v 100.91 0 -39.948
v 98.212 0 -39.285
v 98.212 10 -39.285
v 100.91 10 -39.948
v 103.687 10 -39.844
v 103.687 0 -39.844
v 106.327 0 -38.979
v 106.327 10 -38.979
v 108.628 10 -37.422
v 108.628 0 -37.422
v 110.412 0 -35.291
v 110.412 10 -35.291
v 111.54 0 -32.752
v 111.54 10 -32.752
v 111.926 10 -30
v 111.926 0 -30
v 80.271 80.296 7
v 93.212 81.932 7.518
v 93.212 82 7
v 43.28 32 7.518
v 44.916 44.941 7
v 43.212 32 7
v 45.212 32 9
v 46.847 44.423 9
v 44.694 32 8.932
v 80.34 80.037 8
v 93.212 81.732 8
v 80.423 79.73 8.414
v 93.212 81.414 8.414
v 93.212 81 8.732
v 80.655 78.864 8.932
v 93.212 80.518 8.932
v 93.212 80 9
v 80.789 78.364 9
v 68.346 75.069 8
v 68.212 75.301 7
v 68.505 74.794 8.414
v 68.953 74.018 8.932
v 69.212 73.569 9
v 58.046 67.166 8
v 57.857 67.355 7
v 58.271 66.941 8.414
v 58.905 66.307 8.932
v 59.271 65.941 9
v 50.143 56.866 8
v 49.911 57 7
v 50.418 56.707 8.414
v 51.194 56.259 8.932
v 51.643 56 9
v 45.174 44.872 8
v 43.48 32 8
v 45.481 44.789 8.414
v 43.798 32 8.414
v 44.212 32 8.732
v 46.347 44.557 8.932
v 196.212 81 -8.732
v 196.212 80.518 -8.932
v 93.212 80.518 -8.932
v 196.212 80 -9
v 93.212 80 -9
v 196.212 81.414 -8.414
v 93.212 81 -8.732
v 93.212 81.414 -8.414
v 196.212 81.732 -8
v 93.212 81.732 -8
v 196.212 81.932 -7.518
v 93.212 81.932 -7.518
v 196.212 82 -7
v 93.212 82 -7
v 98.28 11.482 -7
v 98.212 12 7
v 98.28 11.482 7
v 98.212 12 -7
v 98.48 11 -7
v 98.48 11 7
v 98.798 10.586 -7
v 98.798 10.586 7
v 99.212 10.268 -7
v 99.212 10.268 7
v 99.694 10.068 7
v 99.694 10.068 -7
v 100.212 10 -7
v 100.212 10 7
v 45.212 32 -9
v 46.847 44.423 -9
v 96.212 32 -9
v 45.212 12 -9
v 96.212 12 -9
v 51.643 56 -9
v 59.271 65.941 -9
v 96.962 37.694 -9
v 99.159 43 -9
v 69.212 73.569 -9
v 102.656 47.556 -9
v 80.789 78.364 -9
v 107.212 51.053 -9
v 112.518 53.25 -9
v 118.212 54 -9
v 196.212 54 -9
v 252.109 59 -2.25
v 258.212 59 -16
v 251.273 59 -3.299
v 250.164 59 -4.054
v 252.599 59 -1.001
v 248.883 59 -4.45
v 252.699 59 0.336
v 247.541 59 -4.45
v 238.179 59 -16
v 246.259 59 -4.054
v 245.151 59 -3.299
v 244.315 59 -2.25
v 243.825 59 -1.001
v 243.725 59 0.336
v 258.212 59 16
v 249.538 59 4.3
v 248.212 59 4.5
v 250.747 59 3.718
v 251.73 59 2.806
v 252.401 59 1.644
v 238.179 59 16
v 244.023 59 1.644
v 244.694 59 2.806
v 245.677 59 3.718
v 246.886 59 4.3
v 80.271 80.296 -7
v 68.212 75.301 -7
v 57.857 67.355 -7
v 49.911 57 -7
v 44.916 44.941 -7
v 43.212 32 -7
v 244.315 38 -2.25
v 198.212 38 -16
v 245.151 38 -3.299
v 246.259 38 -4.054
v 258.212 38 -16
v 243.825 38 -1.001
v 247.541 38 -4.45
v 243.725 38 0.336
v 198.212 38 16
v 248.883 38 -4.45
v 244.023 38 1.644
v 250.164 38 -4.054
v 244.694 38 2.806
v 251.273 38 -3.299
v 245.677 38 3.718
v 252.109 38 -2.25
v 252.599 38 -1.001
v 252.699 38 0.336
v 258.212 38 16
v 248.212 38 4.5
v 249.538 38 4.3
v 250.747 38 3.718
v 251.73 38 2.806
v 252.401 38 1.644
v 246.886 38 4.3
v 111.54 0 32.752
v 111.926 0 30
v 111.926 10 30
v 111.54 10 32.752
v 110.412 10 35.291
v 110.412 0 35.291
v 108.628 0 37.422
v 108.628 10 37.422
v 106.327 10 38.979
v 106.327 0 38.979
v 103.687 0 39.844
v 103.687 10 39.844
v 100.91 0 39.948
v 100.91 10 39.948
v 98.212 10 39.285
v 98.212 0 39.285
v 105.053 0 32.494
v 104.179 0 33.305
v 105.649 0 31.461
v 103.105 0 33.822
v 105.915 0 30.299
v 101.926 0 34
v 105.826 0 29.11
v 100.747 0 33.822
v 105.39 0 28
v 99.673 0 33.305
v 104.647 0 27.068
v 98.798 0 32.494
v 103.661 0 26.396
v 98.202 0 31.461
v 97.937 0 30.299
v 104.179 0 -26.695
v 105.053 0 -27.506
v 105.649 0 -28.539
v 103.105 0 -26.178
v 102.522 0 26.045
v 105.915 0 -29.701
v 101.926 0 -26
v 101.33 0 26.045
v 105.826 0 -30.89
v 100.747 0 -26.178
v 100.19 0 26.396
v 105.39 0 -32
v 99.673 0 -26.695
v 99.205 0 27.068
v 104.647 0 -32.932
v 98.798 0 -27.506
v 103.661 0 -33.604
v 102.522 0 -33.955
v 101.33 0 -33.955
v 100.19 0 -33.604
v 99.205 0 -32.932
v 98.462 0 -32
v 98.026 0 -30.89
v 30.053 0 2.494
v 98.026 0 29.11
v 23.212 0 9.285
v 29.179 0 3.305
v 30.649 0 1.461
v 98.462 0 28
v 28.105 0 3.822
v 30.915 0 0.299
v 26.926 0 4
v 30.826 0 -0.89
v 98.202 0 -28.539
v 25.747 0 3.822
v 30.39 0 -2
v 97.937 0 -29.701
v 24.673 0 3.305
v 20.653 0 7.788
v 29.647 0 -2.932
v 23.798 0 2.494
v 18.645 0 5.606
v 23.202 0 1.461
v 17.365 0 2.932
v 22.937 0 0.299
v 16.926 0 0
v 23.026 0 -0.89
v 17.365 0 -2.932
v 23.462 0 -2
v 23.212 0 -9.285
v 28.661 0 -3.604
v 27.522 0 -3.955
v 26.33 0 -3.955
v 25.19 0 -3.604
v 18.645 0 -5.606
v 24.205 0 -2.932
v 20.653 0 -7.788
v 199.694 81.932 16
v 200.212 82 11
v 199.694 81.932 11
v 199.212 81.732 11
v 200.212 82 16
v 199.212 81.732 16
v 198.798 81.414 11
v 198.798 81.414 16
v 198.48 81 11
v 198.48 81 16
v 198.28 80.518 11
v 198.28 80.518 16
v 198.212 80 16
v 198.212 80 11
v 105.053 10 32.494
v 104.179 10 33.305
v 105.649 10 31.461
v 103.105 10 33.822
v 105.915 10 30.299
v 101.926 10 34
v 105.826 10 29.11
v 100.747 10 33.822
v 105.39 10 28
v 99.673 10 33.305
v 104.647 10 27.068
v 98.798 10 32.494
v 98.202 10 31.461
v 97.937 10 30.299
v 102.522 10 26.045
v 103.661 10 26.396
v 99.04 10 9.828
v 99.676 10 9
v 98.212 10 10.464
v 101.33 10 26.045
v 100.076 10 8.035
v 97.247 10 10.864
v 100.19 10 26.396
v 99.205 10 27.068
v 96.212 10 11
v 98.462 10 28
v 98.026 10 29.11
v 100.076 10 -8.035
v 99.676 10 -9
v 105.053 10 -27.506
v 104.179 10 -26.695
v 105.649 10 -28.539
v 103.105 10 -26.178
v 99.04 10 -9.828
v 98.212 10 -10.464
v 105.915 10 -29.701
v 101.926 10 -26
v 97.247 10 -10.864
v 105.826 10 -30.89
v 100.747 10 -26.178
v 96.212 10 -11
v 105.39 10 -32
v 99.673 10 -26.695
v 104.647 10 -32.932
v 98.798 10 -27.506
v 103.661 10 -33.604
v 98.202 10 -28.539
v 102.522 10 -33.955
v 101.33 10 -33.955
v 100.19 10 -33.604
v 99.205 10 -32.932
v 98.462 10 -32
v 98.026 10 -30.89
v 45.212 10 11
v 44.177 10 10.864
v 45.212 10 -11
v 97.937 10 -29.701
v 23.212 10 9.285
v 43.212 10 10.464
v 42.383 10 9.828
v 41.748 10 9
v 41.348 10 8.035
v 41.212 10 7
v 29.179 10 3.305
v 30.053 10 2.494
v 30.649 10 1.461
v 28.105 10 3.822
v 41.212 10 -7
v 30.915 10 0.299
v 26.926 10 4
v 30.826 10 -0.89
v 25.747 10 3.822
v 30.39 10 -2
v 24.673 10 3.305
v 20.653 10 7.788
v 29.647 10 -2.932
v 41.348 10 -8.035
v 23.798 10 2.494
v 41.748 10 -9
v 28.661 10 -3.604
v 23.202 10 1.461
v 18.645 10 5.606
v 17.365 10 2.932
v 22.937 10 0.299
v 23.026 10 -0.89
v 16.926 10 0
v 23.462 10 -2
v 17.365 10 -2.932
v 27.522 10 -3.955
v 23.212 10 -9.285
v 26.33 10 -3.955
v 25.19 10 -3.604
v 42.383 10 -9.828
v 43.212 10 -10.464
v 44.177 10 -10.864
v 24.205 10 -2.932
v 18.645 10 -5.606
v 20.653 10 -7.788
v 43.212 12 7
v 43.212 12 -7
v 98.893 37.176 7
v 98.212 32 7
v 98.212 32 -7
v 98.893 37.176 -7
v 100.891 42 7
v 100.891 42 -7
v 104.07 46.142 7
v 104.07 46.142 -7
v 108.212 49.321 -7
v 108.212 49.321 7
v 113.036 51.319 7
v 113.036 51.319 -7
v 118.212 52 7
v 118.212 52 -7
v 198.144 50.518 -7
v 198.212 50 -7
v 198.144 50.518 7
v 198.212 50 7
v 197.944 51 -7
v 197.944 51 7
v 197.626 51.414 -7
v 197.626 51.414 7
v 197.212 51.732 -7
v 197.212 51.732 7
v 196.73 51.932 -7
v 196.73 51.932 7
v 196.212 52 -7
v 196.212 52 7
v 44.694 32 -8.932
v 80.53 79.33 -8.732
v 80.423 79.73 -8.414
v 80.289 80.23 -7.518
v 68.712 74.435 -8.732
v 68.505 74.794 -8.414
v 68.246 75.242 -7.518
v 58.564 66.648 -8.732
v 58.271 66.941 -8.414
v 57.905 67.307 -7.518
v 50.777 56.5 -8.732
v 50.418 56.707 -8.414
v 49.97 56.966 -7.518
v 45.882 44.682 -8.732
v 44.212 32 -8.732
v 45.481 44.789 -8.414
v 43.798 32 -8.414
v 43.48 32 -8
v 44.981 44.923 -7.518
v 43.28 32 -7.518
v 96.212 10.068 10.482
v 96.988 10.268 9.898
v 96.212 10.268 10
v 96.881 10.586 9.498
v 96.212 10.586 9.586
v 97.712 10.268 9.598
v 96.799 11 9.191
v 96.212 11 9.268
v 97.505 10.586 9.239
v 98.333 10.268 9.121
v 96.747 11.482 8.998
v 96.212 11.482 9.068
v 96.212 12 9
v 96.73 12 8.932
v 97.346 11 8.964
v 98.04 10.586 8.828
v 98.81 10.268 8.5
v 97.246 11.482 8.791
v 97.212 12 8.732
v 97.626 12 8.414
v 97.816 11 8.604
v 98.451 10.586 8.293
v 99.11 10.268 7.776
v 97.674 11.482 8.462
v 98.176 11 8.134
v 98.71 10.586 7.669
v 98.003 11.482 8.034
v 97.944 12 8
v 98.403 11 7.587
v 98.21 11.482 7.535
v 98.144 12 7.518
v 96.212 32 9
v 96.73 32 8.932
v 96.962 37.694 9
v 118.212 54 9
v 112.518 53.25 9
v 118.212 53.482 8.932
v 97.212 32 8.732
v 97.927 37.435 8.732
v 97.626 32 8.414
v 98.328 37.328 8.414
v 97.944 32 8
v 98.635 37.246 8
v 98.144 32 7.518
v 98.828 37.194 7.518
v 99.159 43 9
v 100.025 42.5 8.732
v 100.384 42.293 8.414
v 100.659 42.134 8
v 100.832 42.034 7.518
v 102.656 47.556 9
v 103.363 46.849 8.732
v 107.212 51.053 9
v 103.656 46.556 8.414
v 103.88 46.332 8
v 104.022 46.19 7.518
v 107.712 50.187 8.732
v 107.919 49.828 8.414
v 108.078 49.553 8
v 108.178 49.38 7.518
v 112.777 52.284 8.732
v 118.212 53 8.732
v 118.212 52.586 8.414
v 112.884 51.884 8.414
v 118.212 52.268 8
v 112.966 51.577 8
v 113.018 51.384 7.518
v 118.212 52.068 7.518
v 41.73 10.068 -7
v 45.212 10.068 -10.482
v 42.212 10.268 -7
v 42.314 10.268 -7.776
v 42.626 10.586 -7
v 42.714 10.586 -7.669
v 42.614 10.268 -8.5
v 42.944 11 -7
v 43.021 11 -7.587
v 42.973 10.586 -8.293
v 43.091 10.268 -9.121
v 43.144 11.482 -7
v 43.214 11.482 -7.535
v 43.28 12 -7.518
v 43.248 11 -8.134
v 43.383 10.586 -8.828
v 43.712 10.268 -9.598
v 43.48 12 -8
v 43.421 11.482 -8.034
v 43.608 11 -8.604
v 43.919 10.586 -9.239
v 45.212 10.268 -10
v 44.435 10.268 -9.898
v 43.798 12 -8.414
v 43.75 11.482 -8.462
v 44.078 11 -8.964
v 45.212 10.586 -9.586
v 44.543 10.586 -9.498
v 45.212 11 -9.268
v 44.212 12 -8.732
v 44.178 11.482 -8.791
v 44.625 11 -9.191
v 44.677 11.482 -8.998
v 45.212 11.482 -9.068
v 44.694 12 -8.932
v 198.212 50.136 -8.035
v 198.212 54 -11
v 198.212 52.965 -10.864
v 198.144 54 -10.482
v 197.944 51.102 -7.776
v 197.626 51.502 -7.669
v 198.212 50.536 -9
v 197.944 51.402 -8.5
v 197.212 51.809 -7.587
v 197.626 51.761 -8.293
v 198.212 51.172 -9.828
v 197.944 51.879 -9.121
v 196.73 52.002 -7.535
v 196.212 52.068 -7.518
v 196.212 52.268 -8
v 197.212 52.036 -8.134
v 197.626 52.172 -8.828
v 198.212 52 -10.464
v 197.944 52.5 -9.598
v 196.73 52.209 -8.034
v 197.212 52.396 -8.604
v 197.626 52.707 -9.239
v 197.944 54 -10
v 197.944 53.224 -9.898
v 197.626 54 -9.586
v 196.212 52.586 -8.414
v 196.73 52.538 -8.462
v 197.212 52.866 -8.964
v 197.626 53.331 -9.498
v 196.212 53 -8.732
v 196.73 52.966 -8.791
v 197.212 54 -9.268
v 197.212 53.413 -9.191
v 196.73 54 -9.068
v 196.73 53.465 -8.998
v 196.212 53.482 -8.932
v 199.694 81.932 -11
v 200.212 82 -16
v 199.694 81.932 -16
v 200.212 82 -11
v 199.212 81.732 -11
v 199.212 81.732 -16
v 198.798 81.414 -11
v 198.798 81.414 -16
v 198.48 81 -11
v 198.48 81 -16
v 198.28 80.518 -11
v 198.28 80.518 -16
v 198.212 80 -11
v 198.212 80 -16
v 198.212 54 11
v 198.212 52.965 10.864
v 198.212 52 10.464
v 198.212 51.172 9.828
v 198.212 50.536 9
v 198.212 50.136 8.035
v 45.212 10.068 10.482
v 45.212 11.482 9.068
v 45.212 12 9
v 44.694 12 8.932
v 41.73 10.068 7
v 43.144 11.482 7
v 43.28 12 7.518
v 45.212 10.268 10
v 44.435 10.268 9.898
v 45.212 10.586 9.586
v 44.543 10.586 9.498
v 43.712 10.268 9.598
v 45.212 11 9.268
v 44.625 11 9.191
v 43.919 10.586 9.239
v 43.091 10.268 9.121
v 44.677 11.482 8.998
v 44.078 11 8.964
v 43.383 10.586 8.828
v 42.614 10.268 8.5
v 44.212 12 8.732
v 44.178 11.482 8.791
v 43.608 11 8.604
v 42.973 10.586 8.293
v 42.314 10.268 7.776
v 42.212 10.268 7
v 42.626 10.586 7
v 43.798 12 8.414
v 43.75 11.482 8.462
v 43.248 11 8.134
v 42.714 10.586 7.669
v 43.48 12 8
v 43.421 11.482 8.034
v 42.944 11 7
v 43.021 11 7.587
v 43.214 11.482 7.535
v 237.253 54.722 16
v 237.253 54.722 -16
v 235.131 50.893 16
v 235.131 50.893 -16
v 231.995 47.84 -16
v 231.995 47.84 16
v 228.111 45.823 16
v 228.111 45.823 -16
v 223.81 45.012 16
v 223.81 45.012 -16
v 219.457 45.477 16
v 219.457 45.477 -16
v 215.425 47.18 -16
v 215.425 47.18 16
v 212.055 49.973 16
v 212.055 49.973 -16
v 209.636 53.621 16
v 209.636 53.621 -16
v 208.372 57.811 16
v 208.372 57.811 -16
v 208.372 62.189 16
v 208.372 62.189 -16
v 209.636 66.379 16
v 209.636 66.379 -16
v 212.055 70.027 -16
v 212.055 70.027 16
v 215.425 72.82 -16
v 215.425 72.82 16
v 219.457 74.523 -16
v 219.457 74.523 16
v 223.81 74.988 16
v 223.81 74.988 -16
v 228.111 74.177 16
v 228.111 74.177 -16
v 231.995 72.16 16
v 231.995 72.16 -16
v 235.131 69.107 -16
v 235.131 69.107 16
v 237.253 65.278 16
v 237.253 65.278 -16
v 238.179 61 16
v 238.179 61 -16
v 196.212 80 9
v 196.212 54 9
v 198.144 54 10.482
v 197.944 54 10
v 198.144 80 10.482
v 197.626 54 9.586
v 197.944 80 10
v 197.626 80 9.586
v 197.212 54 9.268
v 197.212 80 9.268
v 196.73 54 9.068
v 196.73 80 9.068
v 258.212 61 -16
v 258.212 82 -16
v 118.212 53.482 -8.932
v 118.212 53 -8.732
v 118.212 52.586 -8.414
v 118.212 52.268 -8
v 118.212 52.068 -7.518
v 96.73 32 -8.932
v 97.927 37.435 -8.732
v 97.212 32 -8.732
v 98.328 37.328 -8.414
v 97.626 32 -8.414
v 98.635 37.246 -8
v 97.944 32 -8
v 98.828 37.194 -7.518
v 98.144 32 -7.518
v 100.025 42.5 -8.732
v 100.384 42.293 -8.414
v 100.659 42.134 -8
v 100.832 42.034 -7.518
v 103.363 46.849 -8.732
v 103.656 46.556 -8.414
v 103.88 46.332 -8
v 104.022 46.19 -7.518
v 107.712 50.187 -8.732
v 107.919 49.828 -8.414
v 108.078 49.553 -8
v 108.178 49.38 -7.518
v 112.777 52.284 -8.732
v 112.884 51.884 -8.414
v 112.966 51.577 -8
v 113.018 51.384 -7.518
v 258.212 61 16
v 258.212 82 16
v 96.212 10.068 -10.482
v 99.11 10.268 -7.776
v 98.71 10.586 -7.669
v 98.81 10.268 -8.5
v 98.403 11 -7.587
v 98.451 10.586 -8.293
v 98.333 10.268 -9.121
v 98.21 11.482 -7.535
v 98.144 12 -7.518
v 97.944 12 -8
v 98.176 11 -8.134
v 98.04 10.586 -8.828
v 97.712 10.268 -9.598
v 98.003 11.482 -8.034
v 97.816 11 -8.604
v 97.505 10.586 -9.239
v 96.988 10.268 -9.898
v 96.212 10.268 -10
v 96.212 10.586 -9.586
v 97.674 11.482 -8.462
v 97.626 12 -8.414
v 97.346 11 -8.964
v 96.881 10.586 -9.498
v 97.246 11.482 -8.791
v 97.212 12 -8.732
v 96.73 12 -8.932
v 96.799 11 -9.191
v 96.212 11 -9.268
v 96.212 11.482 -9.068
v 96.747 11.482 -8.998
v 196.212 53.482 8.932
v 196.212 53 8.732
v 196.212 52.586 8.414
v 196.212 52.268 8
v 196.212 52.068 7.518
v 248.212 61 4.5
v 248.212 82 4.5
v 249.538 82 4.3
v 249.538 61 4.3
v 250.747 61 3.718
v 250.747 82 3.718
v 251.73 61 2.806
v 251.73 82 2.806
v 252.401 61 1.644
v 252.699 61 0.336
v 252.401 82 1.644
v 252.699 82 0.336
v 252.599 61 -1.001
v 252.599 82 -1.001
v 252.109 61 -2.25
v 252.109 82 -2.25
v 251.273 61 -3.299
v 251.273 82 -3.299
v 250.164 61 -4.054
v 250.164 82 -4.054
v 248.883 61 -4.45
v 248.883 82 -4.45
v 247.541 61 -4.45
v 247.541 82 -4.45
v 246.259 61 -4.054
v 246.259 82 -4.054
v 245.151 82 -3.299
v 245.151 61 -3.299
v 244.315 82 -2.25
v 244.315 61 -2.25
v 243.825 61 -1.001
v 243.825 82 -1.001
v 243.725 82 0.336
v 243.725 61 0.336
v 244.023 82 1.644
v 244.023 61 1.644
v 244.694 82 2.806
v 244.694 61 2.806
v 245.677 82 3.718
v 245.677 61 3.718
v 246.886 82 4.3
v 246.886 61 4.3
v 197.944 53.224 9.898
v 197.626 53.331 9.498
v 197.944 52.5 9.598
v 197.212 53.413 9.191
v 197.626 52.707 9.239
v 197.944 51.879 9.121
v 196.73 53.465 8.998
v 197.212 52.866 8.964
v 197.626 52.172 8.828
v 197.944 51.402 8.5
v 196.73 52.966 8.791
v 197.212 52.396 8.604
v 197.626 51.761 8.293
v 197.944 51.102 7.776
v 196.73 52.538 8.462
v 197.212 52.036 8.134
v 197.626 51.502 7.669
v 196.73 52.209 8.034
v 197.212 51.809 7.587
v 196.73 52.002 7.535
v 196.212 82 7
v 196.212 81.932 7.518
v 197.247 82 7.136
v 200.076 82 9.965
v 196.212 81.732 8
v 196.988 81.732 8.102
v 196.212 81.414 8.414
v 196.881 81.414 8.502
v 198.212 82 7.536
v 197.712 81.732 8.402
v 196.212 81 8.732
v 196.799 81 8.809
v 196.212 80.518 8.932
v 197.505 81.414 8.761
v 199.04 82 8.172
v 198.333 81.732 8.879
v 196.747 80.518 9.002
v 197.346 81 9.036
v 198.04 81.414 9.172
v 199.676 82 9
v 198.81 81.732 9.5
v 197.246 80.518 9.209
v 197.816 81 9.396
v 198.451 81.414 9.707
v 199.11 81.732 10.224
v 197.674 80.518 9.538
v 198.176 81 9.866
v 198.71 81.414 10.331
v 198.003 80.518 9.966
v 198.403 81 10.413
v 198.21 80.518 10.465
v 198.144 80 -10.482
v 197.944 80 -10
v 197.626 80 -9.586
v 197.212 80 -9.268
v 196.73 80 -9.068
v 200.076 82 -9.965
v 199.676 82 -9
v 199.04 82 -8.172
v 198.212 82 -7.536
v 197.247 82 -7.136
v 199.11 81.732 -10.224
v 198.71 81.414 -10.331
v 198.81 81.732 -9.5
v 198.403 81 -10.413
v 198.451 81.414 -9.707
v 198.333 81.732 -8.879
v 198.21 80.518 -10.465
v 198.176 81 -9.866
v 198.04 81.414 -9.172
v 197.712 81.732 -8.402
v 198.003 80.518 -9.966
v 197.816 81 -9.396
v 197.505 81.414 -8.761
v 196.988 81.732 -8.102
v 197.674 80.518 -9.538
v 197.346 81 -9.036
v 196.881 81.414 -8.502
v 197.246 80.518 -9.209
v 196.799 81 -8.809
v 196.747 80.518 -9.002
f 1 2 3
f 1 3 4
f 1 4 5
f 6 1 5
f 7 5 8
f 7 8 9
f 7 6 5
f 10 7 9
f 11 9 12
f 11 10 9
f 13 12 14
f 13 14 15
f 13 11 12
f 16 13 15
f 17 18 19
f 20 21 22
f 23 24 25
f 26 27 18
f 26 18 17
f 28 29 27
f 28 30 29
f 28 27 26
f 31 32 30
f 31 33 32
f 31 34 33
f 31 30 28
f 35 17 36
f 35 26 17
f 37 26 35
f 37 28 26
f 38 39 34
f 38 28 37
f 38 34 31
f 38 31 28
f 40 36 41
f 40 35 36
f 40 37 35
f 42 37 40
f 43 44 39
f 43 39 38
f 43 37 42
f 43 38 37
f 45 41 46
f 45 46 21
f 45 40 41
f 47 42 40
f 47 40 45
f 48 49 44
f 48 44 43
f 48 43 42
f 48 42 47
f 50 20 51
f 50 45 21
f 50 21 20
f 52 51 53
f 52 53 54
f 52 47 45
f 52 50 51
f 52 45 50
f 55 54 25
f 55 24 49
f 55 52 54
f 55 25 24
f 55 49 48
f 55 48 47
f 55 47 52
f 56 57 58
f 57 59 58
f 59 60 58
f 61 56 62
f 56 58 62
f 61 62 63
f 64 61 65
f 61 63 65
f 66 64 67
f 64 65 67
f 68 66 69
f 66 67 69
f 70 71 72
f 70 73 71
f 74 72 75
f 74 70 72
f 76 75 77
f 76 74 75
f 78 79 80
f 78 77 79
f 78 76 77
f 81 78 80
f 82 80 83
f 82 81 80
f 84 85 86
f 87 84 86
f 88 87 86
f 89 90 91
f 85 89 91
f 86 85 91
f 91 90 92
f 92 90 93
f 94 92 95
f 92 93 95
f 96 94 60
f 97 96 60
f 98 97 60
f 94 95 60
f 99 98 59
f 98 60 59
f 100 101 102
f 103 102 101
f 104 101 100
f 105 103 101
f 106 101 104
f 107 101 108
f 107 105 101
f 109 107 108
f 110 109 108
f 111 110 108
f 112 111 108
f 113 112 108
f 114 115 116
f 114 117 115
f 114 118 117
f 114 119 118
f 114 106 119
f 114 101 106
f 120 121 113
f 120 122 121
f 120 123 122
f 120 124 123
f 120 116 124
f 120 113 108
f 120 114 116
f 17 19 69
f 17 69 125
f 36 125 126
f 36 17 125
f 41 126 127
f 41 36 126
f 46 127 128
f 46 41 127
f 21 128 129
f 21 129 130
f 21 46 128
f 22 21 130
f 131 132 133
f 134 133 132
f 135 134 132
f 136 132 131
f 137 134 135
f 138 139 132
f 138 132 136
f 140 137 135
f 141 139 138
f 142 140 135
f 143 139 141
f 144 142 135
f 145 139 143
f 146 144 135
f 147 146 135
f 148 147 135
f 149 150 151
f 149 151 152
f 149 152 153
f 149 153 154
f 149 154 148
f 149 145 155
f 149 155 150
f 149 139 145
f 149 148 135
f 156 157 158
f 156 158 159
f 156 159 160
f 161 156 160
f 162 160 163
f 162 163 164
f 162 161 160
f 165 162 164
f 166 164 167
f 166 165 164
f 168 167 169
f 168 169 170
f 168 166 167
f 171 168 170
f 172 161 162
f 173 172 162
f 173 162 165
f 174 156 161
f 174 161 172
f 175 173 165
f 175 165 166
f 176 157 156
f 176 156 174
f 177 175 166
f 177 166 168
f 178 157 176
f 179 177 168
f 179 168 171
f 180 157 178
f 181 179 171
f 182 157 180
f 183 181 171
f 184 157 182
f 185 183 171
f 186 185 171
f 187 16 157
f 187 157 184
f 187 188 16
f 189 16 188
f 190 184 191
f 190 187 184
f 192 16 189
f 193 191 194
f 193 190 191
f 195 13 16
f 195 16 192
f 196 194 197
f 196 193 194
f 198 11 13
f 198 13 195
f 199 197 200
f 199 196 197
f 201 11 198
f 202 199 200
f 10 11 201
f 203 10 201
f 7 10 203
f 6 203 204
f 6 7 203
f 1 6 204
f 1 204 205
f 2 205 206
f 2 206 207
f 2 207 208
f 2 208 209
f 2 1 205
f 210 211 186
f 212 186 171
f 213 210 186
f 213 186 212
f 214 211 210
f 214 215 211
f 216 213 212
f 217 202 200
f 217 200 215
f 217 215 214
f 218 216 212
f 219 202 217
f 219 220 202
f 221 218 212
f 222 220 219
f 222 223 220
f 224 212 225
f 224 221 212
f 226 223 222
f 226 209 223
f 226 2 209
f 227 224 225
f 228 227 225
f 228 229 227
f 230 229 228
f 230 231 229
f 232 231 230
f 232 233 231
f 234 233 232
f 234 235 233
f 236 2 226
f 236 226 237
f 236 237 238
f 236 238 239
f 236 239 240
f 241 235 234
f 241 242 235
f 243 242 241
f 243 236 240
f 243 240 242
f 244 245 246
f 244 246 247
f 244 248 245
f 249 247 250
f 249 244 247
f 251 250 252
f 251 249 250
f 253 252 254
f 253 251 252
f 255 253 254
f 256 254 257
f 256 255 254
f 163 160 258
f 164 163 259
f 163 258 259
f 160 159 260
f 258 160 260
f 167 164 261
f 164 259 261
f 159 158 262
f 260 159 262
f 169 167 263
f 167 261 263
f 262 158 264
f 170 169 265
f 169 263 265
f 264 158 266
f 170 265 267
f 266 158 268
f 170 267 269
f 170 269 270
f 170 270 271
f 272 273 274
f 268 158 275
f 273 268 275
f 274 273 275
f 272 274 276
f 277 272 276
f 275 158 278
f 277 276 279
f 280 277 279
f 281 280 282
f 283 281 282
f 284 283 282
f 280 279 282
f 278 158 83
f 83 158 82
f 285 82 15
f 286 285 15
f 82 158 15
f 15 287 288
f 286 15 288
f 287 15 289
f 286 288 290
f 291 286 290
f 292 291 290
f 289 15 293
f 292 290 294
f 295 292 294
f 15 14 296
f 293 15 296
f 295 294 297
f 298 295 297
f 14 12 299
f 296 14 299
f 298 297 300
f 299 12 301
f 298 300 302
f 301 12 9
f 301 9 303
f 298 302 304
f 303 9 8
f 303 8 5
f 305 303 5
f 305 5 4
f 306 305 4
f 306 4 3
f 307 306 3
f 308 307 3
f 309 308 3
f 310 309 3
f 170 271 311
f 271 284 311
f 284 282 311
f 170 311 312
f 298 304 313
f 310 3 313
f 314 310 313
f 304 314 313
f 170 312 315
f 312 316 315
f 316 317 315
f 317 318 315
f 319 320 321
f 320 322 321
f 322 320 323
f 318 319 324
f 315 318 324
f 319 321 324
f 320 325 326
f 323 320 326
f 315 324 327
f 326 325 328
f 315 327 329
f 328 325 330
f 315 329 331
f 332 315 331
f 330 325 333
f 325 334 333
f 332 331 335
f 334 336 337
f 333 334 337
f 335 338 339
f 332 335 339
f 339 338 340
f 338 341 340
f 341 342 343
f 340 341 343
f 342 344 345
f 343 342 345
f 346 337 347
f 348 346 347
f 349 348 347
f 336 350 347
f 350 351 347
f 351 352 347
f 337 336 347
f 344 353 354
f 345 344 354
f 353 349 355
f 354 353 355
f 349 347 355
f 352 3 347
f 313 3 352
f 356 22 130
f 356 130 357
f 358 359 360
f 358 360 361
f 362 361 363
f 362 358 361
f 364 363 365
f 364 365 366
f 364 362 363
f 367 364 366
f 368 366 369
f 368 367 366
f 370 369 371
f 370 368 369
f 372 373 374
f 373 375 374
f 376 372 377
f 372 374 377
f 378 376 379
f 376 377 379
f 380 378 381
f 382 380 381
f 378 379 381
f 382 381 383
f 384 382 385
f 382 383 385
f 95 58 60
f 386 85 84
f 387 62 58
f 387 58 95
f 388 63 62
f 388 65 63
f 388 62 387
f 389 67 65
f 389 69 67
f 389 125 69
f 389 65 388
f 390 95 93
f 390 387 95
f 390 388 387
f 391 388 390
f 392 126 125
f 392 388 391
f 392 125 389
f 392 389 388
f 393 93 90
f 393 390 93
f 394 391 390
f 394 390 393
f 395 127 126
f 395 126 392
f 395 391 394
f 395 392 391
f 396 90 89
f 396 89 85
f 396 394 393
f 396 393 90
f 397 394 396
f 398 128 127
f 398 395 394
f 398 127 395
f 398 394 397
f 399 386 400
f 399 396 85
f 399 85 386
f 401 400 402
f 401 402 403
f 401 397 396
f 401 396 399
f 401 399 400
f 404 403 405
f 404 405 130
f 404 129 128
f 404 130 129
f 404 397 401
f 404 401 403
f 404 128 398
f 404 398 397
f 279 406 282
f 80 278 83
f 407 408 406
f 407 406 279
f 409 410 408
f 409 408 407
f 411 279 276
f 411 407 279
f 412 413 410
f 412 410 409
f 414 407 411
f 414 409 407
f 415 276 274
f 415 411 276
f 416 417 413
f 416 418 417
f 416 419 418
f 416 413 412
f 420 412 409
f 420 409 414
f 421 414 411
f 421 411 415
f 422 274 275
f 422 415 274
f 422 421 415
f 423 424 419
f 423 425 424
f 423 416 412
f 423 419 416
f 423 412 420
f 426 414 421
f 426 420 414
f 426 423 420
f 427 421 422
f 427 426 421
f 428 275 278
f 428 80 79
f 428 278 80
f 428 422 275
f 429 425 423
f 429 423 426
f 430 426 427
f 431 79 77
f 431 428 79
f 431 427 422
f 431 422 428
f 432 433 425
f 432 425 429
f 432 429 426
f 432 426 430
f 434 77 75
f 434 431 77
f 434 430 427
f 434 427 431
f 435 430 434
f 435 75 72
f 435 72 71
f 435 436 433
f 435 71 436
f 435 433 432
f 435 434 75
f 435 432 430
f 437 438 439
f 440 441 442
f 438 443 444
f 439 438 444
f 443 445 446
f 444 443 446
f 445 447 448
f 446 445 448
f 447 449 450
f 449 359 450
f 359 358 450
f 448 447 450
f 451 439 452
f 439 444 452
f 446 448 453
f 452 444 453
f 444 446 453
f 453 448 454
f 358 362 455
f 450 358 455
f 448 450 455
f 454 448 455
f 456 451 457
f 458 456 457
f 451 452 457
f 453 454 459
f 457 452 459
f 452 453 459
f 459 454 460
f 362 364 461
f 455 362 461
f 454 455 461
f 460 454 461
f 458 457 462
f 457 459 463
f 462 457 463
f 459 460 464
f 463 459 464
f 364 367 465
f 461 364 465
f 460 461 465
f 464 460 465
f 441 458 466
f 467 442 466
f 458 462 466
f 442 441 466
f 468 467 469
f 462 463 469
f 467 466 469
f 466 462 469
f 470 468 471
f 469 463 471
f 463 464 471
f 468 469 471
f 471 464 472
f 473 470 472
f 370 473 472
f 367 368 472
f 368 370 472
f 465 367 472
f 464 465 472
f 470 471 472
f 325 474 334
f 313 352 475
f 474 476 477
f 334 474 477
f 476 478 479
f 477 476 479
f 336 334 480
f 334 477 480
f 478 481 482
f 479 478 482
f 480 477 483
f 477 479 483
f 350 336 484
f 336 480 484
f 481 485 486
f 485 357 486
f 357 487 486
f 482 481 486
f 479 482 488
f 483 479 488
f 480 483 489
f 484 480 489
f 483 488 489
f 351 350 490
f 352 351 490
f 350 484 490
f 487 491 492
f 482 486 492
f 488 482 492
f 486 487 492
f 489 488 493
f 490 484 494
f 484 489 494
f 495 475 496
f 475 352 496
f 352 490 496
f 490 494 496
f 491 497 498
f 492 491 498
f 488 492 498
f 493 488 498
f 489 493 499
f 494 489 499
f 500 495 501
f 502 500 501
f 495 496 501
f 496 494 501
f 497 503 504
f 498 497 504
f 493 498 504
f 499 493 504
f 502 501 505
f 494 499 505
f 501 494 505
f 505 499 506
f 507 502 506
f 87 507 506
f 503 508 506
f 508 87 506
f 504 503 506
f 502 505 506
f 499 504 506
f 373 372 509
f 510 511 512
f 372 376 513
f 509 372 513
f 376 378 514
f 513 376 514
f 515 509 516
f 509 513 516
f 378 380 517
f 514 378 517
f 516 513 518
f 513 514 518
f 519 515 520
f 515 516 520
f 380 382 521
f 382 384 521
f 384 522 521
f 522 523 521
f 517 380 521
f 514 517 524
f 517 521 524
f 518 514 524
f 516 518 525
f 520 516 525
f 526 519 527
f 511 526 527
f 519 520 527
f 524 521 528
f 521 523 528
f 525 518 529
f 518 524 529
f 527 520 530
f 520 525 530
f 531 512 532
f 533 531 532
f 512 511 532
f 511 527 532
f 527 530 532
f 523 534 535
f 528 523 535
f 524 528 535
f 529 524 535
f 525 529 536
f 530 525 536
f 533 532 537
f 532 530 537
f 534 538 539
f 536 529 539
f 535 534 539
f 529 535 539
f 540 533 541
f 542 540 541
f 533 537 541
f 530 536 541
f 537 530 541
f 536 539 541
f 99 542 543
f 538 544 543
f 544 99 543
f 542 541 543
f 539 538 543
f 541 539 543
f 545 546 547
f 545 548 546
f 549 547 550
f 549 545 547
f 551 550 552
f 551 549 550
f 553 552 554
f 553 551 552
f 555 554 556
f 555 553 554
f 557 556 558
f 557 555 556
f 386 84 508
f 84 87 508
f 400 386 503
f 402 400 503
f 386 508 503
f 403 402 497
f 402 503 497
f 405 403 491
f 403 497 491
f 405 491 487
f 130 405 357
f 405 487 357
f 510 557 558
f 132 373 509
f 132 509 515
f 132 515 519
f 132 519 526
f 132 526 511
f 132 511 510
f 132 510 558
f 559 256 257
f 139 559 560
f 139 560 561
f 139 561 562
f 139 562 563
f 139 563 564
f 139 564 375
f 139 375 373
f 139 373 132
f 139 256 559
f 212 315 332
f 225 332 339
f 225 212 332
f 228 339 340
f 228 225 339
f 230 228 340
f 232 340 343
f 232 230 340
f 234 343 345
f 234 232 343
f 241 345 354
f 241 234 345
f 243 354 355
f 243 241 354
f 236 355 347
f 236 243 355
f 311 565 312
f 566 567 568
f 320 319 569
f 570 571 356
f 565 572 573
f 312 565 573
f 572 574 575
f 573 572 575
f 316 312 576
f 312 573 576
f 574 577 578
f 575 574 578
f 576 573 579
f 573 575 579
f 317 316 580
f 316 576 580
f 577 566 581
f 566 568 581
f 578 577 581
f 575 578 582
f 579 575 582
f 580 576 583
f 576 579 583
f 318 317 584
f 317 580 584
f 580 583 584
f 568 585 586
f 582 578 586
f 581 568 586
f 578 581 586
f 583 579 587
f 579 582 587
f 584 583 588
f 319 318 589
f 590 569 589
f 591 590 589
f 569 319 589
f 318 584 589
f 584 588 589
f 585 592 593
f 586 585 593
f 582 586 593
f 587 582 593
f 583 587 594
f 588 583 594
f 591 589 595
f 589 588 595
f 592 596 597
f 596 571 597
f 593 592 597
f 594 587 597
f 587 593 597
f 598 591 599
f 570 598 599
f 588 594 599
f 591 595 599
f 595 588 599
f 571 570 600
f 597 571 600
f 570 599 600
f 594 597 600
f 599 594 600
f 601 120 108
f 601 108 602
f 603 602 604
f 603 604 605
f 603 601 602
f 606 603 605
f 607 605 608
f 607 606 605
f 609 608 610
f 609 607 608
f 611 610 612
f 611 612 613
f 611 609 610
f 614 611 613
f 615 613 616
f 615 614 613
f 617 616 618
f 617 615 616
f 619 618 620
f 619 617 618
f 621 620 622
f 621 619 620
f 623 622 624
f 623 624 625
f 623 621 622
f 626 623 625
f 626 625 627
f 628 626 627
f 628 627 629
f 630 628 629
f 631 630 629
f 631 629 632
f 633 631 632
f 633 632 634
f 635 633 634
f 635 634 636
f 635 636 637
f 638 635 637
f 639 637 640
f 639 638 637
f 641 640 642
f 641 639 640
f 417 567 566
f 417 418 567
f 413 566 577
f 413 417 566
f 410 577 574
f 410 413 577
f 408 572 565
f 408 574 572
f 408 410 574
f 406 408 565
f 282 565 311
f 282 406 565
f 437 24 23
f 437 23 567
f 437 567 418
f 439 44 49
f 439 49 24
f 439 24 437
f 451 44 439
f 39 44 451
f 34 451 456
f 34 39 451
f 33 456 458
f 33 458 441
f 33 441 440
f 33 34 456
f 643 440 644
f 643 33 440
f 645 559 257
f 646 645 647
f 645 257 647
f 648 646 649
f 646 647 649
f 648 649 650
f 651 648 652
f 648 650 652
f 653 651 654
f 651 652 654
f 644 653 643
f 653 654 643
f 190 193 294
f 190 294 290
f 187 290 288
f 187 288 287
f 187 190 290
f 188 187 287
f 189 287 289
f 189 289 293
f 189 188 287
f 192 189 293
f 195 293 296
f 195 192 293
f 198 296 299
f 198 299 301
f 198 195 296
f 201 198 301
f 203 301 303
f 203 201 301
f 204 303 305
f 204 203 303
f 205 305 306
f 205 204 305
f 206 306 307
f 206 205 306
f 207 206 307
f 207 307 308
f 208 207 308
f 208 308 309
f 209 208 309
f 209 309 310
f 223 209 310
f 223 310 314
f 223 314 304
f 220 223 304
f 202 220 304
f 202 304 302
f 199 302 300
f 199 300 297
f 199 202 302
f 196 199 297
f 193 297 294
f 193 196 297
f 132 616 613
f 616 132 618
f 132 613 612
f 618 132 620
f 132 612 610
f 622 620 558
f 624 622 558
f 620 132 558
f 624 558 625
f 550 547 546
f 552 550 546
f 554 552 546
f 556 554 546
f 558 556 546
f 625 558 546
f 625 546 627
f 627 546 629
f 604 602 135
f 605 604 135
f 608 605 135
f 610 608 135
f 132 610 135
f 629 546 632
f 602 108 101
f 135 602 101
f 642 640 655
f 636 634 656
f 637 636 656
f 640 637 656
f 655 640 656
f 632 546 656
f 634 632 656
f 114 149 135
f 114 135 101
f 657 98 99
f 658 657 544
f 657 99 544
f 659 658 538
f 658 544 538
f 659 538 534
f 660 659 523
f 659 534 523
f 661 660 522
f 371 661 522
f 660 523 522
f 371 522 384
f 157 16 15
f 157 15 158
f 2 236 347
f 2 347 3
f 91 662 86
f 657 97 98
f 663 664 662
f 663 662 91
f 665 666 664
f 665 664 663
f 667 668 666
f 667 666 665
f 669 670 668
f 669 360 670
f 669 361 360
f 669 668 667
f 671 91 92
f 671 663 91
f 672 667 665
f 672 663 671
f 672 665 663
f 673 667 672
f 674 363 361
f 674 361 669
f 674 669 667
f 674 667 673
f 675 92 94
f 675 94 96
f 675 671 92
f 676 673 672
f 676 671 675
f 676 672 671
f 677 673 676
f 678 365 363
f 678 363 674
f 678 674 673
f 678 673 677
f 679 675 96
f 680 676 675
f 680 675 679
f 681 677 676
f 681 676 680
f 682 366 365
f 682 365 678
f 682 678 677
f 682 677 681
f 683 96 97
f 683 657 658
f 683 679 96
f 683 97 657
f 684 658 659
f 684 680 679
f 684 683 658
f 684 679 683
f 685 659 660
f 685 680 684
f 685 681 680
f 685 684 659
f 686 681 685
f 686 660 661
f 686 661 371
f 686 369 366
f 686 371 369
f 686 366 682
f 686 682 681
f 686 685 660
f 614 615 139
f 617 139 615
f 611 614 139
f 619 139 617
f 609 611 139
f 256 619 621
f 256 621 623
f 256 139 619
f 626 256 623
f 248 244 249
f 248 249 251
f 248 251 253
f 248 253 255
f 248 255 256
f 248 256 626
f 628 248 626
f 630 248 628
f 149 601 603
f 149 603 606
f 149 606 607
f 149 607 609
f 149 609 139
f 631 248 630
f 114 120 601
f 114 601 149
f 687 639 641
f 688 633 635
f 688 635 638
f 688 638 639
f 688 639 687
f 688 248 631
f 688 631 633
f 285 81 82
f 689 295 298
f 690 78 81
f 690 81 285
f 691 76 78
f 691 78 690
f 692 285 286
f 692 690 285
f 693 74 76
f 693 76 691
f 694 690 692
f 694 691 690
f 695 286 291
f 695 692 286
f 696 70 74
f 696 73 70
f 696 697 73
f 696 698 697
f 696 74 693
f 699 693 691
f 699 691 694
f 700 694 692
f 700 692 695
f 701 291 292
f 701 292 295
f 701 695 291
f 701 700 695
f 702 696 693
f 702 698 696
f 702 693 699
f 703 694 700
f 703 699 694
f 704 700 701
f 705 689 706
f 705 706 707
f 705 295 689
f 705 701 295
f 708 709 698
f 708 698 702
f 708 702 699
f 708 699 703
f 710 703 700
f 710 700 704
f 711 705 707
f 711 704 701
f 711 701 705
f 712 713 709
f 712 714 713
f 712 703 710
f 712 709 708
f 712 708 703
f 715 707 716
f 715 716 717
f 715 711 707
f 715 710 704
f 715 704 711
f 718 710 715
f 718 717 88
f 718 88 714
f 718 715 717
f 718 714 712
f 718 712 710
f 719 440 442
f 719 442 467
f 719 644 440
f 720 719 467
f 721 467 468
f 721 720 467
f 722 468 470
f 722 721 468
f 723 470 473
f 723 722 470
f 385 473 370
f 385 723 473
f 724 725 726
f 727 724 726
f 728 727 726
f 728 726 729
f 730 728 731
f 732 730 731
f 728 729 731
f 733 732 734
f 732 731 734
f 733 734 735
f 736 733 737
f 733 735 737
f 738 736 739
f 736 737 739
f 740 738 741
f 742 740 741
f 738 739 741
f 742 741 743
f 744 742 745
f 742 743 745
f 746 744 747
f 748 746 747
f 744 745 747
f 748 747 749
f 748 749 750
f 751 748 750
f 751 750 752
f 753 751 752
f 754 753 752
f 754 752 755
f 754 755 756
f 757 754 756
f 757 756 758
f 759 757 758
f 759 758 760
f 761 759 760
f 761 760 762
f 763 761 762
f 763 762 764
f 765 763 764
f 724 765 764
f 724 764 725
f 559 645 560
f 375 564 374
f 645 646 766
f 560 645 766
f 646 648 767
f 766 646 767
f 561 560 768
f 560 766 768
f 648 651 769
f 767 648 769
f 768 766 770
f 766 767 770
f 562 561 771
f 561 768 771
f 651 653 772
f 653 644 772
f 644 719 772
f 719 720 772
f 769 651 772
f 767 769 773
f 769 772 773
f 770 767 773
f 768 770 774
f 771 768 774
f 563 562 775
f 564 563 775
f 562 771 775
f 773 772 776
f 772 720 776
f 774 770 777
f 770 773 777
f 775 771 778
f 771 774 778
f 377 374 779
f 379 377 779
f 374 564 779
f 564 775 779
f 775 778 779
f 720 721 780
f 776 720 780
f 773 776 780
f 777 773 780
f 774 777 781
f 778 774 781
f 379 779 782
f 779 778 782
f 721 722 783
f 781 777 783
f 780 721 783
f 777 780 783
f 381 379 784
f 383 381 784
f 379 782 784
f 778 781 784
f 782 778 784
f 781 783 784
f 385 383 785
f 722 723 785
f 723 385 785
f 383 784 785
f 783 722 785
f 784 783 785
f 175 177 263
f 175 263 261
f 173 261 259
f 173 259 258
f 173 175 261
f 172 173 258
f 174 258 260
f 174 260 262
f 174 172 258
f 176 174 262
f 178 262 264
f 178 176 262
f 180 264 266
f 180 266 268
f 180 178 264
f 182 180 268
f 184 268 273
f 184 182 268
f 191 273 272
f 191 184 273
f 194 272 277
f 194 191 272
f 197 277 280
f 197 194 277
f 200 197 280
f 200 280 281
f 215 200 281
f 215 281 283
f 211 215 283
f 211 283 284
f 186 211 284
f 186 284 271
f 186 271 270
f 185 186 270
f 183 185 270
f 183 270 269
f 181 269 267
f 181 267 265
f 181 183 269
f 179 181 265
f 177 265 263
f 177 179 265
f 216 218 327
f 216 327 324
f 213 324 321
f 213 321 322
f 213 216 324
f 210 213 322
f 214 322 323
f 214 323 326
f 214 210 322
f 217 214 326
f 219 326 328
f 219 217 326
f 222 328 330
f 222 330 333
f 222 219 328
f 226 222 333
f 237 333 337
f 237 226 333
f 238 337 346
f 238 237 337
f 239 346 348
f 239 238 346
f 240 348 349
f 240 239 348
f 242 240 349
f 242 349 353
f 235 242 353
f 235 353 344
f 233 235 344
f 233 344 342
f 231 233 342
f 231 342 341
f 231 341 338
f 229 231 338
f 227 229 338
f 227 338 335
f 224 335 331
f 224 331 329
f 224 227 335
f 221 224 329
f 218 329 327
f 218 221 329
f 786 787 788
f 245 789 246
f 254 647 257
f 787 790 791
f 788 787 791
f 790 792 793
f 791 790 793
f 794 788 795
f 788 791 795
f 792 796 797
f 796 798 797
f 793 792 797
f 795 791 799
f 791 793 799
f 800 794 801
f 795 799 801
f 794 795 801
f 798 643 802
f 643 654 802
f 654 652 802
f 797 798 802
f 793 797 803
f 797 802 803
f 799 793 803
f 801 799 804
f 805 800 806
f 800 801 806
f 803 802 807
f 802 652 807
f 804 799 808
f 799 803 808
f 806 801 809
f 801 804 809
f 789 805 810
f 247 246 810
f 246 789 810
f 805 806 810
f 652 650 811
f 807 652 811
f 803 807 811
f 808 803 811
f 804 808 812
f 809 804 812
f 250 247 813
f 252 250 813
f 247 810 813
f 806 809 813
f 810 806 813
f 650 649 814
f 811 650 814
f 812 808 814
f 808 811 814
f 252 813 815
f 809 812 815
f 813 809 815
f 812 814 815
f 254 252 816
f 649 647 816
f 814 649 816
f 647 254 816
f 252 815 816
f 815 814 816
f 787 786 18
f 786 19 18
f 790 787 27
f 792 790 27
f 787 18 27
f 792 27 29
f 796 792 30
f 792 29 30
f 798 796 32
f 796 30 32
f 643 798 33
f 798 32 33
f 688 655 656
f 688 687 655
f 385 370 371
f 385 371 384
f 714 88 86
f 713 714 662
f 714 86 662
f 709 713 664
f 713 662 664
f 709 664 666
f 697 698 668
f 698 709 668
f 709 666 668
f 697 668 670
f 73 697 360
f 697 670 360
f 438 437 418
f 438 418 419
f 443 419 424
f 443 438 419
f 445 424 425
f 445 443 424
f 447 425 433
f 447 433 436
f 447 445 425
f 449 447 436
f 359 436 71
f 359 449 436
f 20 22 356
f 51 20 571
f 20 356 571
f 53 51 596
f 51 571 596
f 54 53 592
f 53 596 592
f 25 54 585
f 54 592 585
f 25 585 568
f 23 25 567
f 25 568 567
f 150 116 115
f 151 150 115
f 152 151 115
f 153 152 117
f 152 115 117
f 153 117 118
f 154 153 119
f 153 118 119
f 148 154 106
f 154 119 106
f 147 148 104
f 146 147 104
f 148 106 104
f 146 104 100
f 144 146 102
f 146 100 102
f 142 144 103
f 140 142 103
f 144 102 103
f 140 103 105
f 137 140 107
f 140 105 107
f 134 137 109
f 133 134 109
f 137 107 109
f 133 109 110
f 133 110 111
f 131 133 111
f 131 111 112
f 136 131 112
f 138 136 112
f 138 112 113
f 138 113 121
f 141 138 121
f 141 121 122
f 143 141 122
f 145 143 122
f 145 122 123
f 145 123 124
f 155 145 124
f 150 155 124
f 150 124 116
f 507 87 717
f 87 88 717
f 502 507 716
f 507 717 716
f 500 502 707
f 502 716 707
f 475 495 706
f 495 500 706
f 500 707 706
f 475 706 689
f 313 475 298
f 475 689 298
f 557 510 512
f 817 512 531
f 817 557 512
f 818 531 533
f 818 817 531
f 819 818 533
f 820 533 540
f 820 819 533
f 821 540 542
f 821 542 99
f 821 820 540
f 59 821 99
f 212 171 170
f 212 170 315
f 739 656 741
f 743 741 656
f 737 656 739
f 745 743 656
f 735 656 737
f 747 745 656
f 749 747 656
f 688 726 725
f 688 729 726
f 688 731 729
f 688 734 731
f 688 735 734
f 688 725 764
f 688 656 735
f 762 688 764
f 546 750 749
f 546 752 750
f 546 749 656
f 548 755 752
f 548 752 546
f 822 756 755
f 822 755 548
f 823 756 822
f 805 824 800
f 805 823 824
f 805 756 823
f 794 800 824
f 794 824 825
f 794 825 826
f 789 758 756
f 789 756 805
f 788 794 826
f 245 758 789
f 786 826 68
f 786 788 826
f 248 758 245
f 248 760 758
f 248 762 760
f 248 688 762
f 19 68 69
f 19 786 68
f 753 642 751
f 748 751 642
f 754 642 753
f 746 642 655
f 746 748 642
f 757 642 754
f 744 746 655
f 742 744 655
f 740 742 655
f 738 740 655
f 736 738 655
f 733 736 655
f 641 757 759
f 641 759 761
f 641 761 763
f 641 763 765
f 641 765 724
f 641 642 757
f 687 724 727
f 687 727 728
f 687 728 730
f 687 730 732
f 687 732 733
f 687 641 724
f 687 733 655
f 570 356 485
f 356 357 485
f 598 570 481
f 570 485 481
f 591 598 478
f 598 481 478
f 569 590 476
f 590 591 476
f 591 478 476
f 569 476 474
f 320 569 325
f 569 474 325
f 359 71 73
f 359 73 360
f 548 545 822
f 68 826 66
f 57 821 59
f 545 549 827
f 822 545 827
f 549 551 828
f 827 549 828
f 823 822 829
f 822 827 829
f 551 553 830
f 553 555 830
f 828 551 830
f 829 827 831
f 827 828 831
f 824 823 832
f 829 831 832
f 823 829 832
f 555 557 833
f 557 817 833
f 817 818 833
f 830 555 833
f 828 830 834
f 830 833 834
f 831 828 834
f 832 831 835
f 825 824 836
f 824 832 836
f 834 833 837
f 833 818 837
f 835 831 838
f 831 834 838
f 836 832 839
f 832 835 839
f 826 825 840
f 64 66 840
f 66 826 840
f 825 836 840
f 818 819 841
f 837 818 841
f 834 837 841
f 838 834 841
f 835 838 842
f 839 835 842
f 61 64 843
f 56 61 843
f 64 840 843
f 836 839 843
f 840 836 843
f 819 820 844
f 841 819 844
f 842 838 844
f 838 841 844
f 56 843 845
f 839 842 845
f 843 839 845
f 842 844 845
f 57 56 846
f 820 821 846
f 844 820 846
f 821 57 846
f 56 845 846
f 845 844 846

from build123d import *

# Parameters (mm, degrees)
SKETCH1_R           = 4
BOSS_EXTRUDE1_DEPTH = 10
BOSS_EXTRUDE2_DEPTH = 9
BOSS_EXTRUDE3_DEPTH = 16
SKETCH3_R           = 4.5
CUT_EXTRUDE1_DEPTH  = 274.856521232
FILLET5_R           = 2


with BuildPart() as part:
    # Sketch1 → Boss-Extrude1 (new body)
    with BuildSketch(Plane(origin=(0, 0, 0), x_dir=(1, 0, 0), z_dir=(0, 1, 0))):
        with BuildLine():
            Line((23.211917272, 9.284766909), (98.211917272, 39.284766909))
            ThreePointArc((98.211917272, 39.284766909), (107.532112129, 38.280672305), (111.925824036, 30))
            Line((111.925824036, 30), (111.925824036, -30))
            ThreePointArc((111.925824036, -30), (107.532112129, -38.280672305), (98.211917272, -39.284766909))
            Line((98.211917272, -39.284766909), (23.211917272, -9.284766909))
            ThreePointArc((23.211917272, -9.284766909), (16.925824036, 0), (23.211917272, 9.284766909))
        make_face()
        with Locations((26.925824036, 0)):
            Circle(SKETCH1_R, mode=Mode.SUBTRACT)
        with Locations((101.925824036, 30)):
            Circle(SKETCH1_R, mode=Mode.SUBTRACT)
        with Locations((101.925824036, -30)):
            Circle(SKETCH1_R, mode=Mode.SUBTRACT)
    extrude(amount=BOSS_EXTRUDE1_DEPTH)

    # Sketch2 → Boss-Extrude2 (add, symmetric)
    with BuildSketch(Plane.XY):
        with BuildLine():
            Line((43.211917272, 32), (43.211917272, 10))
            Line((43.211917272, 10), (98.211917272, 10))
            Line((98.211917272, 10), (98.211917272, 32))
            ThreePointArc((98.211917272, 32), (104.069781648, 46.142135624), (118.211917272, 52))
            Line((118.211917272, 52), (198.211917272, 52))
            Line((198.211917272, 52), (198.211917272, 82))
            Line((198.211917272, 82), (93.211917272, 82))
            ThreePointArc((93.211917272, 82), (57.856578213, 67.355339059), (43.211917272, 32))
        make_face()
    extrude(amount=BOSS_EXTRUDE2_DEPTH, both=True)

    # Sketch2<4> → Boss-Extrude3 (add, symmetric)
    with BuildSketch(Plane.XY):
        with BuildLine():
            Line((258.211917272, 82), (198.211917272, 82))
            Line((198.211917272, 82), (198.211917272, 52))
            Line((198.211917272, 52), (198.211917272, 38))
            Line((198.211917272, 38), (258.211917272, 38))
            Line((258.211917272, 38), (258.211917272, 59))
            Line((258.211917272, 59), (238.178546819, 59))
            ThreePointArc((238.178546819, 59), (208.211917272, 60), (238.178546819, 61))
            Line((238.178546819, 61), (258.211917272, 61))
            Line((258.211917272, 61), (258.211917272, 82))
        make_face()
    extrude(amount=BOSS_EXTRUDE3_DEPTH, both=True)

    # Sketch3 → Cut-Extrude1 (cut, through all)
    with BuildSketch(Plane(origin=(0, 82, 0), x_dir=(1, 0, 0), z_dir=(0, 1, 0))):
        with Locations((248.211917272, 0)):
            Circle(SKETCH3_R)
    extrude(amount=-CUT_EXTRUDE1_DEPTH, mode=Mode.SUBTRACT)

    # Fillet5
    fillet5_edges = [part.edges().sort_by_distance(p)[0] for p in [
        (198.211917272, 82, 12.5),
        (198.211917272, 52, 0),
        (198.211917272, 82, -12.5),
        (43.211917272, 10, 0),
        (98.211917272, 10, 0),
        (70.711917272, 10, 9),
        (43.211917272, 21, 9),
        (57.856578213, 67.355339059, 9),
        (145.711917272, 82, 9),
        (198.211917272, 67, 9),
        (158.211917272, 52, 9),
        (104.069781648, 46.142135624, 9),
        (98.211917272, 21, 9),
        (104.069781648, 46.142135624, -9),
        (158.211917272, 52, -9),
        (198.211917272, 67, -9),
        (145.711917272, 82, -9),
        (57.856578213, 67.355339059, -9),
        (43.211917272, 21, -9),
        (70.711917272, 10, -9),
        (98.211917272, 21, -9),
    ]]
    fillet(fillet5_edges, radius=FILLET5_R)


solid = part.part
